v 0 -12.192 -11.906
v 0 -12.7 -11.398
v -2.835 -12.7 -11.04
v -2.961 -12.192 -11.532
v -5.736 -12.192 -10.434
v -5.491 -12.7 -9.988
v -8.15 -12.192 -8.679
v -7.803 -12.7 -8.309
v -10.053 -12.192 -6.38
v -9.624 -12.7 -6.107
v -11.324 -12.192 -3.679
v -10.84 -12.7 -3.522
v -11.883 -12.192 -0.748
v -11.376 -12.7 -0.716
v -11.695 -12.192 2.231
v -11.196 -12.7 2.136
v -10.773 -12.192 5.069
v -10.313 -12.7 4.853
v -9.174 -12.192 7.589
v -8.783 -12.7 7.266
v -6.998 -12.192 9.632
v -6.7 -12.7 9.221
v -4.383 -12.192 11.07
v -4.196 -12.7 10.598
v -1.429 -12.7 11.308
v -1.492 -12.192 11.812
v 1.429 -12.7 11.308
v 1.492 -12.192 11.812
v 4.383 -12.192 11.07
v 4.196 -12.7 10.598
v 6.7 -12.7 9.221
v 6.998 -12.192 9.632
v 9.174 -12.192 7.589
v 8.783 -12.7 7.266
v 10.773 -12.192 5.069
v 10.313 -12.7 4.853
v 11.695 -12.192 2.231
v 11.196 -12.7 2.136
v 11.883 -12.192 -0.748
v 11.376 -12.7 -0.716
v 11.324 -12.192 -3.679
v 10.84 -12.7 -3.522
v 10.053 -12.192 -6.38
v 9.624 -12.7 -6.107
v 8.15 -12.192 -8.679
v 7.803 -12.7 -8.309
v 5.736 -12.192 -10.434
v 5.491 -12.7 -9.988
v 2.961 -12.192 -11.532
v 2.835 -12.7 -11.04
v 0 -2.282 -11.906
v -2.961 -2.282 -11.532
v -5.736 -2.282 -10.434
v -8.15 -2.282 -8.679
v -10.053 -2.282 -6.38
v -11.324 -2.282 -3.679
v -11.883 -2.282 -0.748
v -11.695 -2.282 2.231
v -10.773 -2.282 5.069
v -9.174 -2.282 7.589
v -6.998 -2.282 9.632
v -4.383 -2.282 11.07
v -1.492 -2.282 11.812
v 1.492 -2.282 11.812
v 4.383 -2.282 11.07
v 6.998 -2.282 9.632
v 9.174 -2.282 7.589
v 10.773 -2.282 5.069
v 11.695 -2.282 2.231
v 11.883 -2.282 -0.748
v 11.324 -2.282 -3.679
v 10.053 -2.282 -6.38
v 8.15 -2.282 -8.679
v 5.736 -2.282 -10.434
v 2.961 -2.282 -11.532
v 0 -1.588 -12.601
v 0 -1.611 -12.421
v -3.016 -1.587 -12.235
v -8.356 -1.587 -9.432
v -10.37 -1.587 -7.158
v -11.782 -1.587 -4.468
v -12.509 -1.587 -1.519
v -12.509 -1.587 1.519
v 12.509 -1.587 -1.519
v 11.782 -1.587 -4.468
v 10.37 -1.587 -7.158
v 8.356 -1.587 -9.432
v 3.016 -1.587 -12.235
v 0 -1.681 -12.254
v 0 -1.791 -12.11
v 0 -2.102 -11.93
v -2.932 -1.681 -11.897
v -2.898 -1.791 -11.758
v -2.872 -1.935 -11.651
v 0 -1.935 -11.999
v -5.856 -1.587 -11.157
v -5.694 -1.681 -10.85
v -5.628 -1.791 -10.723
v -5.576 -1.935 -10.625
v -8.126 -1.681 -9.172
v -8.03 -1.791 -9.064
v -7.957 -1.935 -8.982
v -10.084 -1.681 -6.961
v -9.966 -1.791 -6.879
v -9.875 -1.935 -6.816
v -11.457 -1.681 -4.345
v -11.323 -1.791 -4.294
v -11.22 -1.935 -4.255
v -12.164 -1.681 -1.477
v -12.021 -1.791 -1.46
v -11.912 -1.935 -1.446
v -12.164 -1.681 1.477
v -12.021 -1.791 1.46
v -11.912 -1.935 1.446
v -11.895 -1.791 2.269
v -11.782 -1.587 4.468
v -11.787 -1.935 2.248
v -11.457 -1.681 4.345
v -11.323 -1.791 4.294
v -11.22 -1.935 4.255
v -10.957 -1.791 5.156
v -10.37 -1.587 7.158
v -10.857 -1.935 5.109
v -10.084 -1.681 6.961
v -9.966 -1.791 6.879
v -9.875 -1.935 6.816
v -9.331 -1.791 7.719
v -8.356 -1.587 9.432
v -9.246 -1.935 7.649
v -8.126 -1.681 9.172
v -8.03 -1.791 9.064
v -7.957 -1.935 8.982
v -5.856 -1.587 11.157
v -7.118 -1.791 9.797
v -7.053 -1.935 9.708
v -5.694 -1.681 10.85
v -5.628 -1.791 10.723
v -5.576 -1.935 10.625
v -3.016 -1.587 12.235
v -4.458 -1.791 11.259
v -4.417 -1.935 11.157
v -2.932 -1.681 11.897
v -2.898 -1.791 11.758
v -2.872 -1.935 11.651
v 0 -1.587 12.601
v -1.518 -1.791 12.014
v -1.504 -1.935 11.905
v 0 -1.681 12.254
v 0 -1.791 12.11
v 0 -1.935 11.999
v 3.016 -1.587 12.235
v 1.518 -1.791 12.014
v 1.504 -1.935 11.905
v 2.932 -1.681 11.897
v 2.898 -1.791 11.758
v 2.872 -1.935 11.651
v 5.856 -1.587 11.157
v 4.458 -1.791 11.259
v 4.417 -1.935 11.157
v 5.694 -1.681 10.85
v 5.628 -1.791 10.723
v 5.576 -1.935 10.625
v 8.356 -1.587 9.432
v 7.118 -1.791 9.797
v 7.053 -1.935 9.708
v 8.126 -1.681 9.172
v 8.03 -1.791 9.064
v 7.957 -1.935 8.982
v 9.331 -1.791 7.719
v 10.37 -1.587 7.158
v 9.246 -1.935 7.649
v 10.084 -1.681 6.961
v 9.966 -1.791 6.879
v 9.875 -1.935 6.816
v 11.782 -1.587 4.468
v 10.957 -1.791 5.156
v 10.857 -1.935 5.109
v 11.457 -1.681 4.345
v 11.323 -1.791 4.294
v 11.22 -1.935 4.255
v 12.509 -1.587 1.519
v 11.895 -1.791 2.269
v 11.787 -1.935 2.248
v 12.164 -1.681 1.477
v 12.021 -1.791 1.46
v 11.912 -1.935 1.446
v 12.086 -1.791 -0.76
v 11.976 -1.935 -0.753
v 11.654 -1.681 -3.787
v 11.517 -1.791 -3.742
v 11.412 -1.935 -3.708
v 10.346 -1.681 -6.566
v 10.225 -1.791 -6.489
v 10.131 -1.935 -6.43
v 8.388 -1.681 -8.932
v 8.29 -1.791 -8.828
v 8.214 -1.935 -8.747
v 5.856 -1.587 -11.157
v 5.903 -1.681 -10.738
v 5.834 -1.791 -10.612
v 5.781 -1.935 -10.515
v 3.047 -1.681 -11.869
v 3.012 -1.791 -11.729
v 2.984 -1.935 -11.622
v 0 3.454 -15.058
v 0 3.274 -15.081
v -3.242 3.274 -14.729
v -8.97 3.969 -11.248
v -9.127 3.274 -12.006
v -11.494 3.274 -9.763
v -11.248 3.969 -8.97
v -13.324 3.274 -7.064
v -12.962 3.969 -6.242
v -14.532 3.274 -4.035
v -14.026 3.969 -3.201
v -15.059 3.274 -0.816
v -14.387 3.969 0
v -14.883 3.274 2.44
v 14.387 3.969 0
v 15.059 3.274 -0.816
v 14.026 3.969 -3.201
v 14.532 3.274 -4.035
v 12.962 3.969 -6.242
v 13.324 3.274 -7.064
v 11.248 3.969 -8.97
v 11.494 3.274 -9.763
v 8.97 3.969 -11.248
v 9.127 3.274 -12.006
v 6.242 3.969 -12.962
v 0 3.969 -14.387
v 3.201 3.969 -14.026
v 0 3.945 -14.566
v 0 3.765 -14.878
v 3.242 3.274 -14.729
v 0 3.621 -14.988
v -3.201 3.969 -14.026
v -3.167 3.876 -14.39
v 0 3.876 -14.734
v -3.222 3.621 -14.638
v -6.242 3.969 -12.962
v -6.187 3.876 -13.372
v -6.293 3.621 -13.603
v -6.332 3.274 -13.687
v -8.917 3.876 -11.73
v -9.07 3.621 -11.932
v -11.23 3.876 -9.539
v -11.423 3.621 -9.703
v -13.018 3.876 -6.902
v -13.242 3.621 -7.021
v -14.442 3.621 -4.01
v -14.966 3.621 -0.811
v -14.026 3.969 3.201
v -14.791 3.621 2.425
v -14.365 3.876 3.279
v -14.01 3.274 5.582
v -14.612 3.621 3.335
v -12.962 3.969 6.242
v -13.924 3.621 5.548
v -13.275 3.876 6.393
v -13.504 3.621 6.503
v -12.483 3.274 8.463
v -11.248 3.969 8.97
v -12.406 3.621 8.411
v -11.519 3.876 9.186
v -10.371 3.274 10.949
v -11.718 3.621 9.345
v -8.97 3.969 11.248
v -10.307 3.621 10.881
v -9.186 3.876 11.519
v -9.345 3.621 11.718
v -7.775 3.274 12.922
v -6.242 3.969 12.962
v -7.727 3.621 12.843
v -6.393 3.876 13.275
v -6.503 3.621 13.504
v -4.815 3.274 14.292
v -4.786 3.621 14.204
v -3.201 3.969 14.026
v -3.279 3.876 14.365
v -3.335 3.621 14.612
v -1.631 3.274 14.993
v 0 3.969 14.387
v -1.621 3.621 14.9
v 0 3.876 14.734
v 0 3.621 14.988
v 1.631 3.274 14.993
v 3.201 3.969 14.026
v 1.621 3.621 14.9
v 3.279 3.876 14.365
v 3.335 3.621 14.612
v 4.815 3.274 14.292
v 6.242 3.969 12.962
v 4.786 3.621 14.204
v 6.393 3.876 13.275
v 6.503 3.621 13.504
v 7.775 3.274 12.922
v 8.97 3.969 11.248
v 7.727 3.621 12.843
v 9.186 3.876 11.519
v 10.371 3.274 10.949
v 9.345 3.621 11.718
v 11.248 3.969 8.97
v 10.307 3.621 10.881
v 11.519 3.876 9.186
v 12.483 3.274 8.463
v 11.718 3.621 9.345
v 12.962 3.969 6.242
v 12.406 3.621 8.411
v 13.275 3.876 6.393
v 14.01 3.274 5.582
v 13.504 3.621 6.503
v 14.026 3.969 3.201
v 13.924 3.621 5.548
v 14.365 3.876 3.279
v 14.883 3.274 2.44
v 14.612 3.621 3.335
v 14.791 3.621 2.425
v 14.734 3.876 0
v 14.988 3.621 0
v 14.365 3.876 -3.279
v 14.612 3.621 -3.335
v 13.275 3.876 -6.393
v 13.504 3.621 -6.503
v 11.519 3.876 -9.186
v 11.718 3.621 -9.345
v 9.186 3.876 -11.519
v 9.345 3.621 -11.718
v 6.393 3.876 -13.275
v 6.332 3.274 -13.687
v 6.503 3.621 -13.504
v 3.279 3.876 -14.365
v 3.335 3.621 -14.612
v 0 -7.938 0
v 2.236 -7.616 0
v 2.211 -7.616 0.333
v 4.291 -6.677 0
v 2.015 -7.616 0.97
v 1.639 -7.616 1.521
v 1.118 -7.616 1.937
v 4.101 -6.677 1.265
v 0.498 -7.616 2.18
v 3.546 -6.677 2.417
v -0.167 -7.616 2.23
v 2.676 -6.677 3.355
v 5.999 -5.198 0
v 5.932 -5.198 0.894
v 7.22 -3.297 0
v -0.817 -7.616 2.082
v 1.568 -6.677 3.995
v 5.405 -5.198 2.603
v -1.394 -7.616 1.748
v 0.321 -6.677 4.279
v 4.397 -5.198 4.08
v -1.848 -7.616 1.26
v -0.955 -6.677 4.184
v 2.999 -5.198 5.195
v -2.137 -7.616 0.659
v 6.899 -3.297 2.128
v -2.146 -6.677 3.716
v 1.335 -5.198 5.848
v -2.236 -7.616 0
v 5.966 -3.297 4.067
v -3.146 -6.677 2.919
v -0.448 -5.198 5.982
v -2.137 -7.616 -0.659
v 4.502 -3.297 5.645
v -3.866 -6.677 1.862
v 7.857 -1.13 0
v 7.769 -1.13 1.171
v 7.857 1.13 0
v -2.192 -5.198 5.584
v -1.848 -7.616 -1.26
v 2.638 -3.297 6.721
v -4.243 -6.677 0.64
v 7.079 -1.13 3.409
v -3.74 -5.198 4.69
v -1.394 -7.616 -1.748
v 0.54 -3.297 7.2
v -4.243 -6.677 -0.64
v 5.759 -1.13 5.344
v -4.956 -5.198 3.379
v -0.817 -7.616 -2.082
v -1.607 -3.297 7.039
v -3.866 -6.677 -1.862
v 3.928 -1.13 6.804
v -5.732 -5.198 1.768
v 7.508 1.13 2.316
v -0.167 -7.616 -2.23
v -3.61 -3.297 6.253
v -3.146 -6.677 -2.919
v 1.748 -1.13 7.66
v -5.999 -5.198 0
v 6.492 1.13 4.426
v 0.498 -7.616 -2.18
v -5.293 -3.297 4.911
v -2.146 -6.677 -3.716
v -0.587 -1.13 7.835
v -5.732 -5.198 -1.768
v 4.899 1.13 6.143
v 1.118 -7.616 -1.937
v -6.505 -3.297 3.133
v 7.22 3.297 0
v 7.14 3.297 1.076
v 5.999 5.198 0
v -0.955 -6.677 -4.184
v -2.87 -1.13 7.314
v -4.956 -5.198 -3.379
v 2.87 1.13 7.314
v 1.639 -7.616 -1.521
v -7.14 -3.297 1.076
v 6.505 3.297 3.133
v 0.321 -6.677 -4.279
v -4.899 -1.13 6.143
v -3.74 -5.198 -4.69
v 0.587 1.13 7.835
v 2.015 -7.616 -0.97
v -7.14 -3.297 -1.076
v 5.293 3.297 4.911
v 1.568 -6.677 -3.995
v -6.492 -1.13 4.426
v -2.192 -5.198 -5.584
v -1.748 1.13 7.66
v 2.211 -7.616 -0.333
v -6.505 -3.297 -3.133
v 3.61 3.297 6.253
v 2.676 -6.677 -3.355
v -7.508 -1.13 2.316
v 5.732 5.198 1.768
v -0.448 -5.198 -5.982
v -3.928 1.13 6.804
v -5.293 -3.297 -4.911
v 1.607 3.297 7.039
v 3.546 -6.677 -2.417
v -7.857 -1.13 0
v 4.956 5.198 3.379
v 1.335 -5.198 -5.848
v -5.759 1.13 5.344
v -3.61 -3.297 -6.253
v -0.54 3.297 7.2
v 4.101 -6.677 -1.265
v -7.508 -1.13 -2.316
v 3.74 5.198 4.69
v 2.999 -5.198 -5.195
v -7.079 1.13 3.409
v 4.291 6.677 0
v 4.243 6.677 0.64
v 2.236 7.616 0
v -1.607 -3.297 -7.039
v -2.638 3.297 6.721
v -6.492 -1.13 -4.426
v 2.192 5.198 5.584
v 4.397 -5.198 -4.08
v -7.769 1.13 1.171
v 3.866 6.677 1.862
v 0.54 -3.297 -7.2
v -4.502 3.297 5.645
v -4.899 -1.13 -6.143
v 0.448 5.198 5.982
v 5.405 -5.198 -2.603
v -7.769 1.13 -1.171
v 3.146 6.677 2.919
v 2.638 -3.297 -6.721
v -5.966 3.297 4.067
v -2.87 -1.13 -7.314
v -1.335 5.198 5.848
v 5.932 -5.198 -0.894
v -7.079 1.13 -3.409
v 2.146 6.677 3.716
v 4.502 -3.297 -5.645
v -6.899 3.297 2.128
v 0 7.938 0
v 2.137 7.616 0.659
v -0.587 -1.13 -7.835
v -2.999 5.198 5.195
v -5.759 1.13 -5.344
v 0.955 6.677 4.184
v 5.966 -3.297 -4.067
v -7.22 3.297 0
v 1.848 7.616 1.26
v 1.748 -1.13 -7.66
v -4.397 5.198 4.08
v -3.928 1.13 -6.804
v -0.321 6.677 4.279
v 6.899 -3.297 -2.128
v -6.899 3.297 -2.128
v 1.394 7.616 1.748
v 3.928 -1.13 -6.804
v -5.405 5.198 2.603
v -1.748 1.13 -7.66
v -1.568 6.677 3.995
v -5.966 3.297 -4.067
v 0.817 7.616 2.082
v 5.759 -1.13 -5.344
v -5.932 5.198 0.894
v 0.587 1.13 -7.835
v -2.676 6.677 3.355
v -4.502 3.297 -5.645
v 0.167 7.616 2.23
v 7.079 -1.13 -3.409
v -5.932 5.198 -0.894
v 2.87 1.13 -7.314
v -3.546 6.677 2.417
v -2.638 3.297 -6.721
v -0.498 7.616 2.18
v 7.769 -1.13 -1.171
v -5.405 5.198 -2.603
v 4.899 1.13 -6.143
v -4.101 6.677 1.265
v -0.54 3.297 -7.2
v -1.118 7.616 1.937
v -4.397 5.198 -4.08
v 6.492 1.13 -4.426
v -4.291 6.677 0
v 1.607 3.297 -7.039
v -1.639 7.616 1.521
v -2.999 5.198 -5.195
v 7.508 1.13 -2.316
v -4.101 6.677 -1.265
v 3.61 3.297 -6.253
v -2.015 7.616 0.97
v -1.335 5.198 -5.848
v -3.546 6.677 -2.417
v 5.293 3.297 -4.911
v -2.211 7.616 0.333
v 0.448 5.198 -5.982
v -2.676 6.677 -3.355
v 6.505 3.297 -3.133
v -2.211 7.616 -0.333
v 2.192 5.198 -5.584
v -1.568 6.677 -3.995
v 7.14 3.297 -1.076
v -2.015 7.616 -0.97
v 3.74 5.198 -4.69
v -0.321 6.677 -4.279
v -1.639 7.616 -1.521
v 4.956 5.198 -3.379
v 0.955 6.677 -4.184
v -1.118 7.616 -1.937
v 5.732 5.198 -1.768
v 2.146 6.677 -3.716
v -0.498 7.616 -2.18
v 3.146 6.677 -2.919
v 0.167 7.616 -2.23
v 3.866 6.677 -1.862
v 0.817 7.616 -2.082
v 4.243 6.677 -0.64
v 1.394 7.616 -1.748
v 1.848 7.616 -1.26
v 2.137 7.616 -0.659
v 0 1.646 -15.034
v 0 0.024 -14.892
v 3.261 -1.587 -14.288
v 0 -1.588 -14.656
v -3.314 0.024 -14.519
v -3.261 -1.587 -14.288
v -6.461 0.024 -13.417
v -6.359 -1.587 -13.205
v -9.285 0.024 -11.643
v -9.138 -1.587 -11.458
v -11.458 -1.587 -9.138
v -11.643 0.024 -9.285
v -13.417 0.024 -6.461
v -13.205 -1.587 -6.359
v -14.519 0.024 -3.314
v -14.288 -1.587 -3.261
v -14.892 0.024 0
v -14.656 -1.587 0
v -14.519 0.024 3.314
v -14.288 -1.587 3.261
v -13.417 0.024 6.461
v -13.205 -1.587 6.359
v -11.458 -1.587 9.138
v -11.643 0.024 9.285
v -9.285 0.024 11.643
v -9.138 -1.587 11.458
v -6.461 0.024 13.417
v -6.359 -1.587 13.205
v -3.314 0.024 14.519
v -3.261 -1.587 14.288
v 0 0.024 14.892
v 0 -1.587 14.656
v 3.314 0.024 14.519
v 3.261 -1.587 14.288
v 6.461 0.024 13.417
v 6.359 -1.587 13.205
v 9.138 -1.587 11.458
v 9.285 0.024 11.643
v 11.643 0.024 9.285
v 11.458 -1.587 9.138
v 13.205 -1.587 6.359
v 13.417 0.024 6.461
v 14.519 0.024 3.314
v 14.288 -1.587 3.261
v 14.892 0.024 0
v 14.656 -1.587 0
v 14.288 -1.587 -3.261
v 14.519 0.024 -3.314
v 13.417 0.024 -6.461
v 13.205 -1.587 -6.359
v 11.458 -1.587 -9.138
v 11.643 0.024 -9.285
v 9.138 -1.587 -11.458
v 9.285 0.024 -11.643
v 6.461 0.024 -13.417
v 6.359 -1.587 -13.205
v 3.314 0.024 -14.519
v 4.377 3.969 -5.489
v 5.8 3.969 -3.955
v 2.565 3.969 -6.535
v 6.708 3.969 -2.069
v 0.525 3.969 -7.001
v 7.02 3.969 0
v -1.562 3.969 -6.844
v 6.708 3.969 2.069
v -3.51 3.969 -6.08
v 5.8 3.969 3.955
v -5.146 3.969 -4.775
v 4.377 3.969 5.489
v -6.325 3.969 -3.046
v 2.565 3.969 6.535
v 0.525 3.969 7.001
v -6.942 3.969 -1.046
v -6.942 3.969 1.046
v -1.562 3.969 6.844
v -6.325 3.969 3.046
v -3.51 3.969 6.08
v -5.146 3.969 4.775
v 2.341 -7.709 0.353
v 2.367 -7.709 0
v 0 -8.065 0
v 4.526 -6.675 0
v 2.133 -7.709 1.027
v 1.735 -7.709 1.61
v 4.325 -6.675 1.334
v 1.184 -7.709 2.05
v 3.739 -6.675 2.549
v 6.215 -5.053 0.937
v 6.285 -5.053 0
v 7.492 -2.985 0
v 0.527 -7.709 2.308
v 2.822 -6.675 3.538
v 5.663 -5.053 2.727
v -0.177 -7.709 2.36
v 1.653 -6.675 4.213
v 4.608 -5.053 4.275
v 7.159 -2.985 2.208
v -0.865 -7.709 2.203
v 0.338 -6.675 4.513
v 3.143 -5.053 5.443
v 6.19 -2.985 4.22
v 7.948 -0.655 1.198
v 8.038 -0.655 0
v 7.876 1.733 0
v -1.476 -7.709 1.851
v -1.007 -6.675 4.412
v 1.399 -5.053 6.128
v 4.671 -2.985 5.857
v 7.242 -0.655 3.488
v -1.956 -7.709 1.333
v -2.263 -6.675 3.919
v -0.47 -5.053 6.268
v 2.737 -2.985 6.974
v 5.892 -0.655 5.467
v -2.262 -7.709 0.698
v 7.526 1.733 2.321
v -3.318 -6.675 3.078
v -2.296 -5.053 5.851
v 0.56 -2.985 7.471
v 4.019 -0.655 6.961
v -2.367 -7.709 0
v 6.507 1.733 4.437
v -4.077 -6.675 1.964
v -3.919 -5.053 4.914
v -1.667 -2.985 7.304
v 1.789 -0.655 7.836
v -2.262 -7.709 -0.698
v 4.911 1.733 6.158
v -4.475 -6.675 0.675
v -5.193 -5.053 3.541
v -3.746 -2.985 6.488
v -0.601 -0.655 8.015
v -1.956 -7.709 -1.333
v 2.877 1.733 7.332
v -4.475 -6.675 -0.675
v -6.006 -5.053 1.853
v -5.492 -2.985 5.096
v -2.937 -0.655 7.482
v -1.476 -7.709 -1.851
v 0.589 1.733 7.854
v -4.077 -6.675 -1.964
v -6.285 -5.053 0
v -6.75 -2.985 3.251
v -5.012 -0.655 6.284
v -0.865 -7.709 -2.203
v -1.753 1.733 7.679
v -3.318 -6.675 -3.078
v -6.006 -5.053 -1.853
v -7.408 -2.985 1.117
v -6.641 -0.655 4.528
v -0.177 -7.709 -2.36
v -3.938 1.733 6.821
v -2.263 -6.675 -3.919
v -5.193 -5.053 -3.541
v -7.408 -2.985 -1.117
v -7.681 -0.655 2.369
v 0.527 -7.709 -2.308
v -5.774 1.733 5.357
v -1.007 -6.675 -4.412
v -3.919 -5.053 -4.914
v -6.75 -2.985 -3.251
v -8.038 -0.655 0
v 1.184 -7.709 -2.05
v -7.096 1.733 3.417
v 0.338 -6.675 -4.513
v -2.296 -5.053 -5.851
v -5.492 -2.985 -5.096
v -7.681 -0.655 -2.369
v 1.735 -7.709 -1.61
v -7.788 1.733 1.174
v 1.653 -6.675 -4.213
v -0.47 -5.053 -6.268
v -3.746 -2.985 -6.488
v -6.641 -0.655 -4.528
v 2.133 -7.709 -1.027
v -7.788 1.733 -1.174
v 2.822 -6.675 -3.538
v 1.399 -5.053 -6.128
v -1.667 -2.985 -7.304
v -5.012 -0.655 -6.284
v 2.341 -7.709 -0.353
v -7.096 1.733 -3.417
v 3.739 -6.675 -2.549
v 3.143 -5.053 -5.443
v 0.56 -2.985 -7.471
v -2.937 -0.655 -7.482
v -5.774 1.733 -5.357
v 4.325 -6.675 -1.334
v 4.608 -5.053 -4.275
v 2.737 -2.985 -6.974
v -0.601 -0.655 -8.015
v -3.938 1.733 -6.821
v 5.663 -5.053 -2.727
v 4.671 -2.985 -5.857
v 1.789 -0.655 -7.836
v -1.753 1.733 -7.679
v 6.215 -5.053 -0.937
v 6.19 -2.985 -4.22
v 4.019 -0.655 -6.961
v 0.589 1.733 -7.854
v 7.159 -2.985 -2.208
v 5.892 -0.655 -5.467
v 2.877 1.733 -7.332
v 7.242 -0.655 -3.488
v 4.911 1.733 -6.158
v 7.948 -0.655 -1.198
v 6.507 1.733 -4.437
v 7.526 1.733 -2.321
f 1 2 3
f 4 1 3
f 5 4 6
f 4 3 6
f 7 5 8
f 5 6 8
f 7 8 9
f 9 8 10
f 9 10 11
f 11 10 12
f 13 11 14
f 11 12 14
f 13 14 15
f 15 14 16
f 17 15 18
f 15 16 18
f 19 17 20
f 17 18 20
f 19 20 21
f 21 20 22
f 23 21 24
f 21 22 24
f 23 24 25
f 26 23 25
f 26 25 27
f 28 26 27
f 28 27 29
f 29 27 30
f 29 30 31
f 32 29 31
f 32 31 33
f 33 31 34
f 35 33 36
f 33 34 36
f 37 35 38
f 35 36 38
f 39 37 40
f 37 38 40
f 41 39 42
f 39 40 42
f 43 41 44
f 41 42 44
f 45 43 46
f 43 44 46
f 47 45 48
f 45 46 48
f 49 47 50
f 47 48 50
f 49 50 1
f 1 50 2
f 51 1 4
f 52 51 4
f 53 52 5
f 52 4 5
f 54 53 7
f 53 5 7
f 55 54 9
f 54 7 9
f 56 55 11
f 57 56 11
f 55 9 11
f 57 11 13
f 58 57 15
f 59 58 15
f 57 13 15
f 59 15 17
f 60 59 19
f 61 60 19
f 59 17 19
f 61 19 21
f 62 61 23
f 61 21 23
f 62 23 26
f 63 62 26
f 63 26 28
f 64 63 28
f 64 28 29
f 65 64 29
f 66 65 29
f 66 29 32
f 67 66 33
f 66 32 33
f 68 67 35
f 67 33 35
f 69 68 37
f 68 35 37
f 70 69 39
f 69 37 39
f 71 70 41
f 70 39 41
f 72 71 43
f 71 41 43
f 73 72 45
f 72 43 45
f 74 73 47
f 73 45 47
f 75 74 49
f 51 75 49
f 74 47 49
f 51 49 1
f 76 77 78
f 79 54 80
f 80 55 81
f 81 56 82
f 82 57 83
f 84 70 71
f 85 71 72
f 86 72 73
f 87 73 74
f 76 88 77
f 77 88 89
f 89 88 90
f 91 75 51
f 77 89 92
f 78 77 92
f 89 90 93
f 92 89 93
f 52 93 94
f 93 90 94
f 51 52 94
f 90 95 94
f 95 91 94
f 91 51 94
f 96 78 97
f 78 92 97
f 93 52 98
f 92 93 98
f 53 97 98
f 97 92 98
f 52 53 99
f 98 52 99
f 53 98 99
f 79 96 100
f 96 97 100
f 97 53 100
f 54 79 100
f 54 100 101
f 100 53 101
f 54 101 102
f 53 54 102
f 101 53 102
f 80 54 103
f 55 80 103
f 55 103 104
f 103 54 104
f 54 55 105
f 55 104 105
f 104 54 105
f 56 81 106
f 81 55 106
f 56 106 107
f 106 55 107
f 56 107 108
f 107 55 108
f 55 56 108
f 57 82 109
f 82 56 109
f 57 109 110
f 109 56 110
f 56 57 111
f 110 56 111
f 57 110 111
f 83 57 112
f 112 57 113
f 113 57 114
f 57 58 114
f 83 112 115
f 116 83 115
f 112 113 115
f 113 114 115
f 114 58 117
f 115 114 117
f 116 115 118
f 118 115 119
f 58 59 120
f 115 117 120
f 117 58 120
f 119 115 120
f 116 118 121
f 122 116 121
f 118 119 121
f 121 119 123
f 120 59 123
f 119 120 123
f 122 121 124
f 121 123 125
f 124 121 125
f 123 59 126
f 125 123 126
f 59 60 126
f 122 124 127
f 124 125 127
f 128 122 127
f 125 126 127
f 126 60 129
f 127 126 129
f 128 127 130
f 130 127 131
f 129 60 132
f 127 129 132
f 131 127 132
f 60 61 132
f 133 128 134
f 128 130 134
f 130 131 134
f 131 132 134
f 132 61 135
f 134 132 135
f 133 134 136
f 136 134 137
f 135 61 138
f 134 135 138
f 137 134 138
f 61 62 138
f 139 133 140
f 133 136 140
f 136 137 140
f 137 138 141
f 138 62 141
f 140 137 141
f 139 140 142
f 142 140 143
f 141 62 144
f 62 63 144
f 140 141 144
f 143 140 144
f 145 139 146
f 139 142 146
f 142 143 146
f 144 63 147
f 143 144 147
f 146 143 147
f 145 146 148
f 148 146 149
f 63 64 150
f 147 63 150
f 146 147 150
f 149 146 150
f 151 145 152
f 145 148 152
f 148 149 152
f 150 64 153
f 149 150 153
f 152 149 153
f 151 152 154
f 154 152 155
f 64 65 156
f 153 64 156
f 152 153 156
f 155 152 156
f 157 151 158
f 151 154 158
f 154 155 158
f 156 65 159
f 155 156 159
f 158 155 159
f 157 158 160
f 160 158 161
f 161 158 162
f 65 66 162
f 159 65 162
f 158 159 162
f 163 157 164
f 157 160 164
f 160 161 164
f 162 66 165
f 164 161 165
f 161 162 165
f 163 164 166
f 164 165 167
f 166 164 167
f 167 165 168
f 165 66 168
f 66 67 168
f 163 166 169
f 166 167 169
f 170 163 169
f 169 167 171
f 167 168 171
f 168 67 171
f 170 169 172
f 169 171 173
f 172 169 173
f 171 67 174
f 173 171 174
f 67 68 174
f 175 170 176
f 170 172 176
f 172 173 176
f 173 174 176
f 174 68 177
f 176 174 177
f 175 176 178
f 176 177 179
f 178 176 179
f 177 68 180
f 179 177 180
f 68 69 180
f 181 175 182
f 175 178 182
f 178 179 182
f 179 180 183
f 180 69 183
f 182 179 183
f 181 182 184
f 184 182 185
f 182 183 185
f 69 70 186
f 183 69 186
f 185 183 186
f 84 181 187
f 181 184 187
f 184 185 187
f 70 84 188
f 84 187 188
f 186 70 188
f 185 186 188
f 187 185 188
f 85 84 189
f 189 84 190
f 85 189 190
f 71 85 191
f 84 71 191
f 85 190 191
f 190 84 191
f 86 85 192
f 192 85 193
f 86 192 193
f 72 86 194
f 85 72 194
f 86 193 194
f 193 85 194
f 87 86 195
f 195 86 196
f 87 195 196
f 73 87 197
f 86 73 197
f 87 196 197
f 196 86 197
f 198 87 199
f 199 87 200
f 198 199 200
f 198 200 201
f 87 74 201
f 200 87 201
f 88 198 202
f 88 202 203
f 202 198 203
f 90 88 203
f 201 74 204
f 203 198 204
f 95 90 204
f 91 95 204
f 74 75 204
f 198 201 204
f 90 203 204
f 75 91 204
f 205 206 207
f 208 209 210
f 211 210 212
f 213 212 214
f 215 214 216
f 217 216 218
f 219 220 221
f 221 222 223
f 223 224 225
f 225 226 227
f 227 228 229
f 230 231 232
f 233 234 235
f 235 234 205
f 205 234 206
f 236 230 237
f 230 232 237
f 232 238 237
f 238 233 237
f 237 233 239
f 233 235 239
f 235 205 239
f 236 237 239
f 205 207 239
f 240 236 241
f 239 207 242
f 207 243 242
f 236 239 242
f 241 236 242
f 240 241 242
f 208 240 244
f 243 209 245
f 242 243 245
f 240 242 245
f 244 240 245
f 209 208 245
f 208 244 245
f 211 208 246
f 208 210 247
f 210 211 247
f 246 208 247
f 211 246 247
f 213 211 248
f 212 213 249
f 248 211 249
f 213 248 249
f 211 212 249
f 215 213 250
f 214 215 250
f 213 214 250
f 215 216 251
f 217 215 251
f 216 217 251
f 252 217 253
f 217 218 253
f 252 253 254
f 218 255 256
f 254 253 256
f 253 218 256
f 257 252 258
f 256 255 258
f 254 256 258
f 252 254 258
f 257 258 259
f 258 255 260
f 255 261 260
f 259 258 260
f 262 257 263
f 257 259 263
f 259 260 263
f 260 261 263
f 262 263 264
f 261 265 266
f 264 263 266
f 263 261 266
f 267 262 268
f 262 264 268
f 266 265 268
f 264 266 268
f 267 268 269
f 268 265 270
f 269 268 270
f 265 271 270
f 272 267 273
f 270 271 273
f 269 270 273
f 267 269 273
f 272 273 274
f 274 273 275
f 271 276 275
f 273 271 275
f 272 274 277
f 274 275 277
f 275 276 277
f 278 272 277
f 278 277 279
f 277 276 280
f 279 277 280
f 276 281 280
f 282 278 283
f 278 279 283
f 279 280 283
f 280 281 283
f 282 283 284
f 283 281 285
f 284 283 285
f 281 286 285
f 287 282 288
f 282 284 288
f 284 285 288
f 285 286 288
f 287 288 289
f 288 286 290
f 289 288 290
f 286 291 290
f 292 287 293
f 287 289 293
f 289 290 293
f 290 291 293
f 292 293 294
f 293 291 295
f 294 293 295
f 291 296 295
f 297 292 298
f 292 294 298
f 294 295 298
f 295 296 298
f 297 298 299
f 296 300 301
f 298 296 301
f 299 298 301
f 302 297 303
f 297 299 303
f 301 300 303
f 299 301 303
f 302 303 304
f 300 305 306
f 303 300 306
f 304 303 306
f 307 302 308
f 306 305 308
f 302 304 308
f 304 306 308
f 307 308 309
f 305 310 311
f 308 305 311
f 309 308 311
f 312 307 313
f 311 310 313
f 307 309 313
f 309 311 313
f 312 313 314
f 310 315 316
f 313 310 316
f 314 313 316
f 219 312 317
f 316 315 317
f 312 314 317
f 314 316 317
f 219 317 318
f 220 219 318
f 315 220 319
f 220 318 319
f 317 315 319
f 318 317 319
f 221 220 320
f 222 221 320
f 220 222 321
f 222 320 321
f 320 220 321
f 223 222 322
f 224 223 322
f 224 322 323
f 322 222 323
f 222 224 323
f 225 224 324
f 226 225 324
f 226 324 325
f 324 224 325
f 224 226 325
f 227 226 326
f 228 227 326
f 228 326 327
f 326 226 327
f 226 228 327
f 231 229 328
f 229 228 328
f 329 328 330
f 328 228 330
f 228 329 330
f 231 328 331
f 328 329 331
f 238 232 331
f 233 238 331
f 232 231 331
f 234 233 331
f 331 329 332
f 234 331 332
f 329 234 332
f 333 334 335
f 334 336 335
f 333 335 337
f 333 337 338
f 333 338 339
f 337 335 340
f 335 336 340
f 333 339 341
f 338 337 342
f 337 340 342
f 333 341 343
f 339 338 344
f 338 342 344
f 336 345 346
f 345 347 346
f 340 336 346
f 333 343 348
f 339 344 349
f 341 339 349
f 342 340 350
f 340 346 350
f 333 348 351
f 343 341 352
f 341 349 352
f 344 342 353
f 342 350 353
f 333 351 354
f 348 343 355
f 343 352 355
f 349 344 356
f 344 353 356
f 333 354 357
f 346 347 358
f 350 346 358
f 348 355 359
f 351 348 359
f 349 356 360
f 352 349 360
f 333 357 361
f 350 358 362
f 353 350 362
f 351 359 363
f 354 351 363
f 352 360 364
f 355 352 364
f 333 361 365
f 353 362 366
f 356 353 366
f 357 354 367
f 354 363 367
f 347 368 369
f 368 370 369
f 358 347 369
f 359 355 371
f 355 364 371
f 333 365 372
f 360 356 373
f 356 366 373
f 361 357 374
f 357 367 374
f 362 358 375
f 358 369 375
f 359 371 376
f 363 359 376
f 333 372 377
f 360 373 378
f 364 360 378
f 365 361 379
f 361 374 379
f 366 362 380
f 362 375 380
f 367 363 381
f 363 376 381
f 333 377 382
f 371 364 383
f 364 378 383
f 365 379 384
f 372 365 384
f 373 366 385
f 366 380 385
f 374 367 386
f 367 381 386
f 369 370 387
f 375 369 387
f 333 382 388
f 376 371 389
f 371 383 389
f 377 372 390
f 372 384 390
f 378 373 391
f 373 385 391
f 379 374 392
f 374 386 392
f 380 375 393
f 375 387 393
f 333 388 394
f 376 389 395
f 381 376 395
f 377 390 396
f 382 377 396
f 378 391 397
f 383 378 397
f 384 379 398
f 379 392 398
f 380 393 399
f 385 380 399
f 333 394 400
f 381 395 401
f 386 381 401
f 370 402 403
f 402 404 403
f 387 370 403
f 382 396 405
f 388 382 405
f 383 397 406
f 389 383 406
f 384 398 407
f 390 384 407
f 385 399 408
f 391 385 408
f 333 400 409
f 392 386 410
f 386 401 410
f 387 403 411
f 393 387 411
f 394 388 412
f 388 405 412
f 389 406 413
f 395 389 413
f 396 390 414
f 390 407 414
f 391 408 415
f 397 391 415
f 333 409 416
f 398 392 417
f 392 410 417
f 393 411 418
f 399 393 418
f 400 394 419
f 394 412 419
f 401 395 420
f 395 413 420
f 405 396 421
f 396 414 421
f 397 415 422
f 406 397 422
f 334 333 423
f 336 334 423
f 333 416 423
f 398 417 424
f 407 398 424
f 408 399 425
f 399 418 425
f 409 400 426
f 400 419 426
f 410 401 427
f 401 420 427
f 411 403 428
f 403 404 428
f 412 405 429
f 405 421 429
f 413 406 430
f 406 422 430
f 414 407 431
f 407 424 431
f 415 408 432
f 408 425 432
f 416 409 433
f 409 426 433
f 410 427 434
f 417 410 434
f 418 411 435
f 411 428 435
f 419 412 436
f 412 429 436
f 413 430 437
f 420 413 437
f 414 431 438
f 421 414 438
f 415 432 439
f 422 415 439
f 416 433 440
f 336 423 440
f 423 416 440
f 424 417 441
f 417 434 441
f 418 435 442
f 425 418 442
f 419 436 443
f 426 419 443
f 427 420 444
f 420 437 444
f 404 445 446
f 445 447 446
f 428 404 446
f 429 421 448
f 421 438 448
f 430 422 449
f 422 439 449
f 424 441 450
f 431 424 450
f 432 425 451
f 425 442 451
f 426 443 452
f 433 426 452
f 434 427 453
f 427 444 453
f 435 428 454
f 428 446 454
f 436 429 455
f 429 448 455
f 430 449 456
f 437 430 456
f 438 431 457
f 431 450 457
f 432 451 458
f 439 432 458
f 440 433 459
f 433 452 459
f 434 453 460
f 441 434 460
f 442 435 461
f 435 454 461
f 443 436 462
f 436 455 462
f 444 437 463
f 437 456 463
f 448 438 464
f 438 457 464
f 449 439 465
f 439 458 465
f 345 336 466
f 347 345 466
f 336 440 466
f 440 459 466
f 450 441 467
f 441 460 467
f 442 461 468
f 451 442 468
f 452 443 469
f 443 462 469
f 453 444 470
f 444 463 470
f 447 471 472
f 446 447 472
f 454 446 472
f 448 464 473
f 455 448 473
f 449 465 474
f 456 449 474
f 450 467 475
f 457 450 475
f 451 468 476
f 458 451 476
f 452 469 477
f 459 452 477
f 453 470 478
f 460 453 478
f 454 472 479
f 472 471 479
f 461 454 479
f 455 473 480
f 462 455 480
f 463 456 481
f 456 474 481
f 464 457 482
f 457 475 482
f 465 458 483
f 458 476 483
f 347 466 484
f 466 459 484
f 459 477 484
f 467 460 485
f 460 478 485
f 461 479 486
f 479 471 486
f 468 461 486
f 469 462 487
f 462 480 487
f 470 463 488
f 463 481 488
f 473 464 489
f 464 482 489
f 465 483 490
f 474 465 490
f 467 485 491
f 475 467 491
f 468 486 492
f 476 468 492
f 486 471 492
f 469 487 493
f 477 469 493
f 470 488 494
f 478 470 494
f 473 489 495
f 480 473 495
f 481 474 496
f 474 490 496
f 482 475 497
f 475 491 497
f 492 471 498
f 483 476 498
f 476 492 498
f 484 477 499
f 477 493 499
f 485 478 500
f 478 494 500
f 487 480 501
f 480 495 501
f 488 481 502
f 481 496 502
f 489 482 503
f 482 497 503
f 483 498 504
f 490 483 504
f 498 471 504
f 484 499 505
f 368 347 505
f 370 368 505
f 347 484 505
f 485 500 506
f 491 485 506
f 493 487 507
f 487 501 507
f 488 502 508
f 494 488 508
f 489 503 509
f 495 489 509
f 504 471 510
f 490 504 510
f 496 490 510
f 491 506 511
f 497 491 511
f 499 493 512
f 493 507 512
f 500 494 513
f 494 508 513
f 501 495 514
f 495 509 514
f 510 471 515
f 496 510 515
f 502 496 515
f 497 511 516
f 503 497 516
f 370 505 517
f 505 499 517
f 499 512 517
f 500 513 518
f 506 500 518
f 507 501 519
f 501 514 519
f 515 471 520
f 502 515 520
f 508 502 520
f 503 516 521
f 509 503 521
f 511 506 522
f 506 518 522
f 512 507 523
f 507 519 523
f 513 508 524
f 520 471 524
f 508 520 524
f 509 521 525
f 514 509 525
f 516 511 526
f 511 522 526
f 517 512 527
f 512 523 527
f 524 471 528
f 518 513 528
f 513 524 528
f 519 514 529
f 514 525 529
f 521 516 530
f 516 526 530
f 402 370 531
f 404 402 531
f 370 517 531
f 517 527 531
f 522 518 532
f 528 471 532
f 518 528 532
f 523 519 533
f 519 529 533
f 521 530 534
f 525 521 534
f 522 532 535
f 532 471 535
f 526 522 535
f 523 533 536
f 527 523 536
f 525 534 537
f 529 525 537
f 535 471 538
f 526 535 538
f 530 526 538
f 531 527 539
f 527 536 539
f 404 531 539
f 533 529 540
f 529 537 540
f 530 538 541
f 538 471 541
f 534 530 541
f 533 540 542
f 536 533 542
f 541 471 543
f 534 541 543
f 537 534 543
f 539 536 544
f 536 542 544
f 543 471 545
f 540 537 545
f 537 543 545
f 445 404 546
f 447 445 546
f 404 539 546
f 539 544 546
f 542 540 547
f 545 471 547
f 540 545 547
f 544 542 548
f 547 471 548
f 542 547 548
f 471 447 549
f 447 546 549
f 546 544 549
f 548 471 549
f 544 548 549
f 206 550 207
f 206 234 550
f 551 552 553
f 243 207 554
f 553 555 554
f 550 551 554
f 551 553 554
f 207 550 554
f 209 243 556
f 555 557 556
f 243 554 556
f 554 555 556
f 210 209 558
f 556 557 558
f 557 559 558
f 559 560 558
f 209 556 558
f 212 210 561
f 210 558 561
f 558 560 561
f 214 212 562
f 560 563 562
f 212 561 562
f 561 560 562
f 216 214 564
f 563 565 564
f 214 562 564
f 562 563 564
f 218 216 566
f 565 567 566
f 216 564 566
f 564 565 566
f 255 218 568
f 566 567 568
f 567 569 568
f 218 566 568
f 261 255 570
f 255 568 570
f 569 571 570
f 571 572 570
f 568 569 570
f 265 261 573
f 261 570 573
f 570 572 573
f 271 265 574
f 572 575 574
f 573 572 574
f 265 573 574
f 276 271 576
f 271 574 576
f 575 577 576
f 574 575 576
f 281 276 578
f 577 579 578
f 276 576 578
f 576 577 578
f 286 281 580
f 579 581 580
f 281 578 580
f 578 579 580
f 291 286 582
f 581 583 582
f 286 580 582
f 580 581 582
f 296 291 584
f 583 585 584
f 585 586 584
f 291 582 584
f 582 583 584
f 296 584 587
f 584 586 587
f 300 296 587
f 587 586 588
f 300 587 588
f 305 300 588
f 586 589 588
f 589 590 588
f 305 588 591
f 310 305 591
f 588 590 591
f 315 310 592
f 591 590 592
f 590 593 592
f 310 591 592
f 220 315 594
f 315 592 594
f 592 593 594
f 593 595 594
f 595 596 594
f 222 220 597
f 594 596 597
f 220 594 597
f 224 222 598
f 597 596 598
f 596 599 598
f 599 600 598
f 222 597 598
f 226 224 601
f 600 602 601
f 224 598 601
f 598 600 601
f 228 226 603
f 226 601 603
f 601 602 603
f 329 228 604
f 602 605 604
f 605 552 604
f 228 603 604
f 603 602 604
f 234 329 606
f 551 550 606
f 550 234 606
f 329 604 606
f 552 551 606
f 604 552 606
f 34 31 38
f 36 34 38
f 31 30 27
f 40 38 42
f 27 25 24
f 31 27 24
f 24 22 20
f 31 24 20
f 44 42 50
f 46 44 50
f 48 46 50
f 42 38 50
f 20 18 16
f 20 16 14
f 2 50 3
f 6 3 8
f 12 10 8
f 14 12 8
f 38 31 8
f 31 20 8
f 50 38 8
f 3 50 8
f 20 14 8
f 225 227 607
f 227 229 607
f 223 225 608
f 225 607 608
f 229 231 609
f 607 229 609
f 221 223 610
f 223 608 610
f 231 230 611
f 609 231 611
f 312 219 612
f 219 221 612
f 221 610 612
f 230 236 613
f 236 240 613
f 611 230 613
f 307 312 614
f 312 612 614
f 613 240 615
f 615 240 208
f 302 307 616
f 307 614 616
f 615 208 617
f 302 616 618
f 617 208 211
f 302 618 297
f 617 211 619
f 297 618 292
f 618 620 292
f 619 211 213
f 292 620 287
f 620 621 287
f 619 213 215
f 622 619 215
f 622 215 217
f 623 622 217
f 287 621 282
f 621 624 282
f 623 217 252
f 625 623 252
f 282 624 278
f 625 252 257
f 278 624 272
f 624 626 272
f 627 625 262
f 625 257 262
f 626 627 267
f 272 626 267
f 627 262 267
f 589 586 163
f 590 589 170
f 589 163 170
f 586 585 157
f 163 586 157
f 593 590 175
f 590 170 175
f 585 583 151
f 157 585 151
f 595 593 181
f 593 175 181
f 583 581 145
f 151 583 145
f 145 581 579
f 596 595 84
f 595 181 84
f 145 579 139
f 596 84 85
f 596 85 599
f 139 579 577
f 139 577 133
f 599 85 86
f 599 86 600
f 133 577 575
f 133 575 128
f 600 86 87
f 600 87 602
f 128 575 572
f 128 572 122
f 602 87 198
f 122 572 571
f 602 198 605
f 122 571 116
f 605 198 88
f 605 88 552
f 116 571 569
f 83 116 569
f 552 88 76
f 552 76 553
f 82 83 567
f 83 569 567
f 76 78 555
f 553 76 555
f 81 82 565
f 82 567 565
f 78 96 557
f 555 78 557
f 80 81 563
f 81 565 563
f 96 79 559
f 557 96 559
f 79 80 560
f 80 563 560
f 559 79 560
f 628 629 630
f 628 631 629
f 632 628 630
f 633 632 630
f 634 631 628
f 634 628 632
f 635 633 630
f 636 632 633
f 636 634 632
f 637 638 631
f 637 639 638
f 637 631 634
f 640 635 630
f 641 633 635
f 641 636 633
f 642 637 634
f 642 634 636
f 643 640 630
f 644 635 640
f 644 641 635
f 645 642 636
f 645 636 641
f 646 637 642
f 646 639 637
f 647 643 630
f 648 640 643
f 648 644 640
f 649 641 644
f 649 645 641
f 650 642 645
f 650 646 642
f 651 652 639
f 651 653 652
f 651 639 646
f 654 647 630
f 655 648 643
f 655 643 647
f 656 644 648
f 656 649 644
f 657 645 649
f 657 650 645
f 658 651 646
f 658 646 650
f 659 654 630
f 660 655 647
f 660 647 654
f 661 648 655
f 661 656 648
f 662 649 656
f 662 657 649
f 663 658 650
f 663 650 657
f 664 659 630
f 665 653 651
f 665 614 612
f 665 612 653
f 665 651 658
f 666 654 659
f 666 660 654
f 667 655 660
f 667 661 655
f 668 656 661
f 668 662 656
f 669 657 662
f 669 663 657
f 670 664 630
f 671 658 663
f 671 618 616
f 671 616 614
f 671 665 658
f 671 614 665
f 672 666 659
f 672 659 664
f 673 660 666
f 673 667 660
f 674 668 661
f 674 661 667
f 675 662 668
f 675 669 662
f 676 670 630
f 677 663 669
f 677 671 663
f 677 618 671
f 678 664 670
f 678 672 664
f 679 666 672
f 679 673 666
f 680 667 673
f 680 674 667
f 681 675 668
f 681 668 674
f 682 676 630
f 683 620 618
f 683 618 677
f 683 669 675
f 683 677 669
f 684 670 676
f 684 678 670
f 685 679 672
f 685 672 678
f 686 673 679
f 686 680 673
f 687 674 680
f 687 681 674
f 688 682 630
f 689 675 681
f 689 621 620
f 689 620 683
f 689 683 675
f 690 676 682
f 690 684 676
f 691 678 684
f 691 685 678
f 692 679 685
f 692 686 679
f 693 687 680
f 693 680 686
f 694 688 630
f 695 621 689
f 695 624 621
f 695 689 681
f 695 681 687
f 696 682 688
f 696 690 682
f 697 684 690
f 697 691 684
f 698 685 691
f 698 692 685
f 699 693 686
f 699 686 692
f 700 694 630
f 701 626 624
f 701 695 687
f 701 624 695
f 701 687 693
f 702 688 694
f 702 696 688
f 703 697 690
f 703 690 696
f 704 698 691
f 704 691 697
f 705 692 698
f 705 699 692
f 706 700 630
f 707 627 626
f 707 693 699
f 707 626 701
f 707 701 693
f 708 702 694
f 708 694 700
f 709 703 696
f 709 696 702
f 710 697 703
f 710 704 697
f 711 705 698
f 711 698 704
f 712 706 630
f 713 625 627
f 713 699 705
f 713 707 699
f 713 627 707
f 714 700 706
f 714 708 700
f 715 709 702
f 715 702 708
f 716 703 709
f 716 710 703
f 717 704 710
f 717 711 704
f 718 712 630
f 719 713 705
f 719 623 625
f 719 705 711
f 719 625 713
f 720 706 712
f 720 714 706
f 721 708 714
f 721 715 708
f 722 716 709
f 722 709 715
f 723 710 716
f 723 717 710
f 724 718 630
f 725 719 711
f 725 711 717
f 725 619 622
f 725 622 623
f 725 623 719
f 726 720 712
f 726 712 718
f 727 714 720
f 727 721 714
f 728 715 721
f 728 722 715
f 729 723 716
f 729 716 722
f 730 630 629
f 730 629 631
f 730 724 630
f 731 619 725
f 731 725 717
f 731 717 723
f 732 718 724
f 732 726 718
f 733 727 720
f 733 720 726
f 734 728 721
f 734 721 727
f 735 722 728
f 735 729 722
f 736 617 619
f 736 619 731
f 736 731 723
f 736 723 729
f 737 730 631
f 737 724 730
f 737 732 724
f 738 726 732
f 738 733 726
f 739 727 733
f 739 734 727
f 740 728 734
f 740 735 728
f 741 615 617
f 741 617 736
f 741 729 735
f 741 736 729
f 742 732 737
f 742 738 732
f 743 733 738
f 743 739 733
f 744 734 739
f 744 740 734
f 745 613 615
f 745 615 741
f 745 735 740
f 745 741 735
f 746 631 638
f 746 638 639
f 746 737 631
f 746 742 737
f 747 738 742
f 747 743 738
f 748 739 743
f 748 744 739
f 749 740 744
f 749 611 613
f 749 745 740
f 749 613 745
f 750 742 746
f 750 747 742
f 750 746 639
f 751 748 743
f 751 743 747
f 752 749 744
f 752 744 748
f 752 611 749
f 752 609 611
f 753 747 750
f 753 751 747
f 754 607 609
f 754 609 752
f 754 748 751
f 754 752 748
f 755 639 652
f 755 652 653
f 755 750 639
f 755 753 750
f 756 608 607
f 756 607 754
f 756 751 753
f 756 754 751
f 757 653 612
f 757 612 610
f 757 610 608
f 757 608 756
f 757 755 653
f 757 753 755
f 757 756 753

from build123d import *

# Parameters (mm, degrees)
MOVE_FACE1_BY      = 0.127
CHAMFER2_SIZE      = 0.508
CHAMFER1_SIZE      = 0.9525
CUT_SWEEP1_PITCH   = 1.27
CUT_SWEEP1_TO      = 19.05
SKETCH7_R          = 5.08
CUT_EXTRUDE1_DEPTH = 19.05


with BuildPart() as part:
    # Sketch1 → Revolve1 (revolve)
    with BuildSketch(Plane.XY, mode=Mode.PRIVATE) as revolve1_sk:
        with BuildLine():
            Line((0, 3.96875), (14.38671875, 3.96875))
            ThreePointArc((14.38671875, 3.96875), (14.877826507, 3.765326507), (15.08125, 3.27421875))
            ThreePointArc((15.08125, 3.27421875), (14.974710974, 0.834073887), (14.655904724, -1.5875))
            Line((14.655904724, -1.5875), (12.60078125, -1.5875))
            ThreePointArc((12.60078125, -1.5875), (12.109673493, -1.790923493), (11.90625, -2.28203125))
            Line((11.90625, -2.28203125), (11.90625, -12.7))
            Line((11.90625, -12.7), (3.175, -12.7))
            Line((3.175, -12.7), (3.175, -31.75))
            Line((3.175, -31.75), (0, -31.75))
            Line((0, -31.75), (0, 3.96875))
        make_face()
    revolve(revolve1_sk.sketch.rotate(Axis((0, -31.75, 0), (0, 1, 0)), 90), axis=Axis((0, -31.75, 0), (0, 1, 0)))

    # Sketch2 → Cut-Revolve1 (revolve, cut)
    with BuildSketch(Plane.XY):
        with BuildLine():
            Line((0, 7.9375), (0, -7.9375))
            ThreePointArc((0, -7.9375), (7.9375, 0), (0, 7.9375))
        make_face()
    revolve(axis=Axis((0, 7.9375, 0), (0, -1, 0)), mode=Mode.SUBTRACT)

    # Move Face1: a curved face moved inward by 0.127
    add(Solid.thicken(part.faces().sort_by_distance((-6.874076643, -3.96875, 0))[0], -MOVE_FACE1_BY), mode=Mode.SUBTRACT)

    # Chamfer2
    chamfer2_edges = [part.edges().sort_by_distance(p)[0] for p in [
        (0, -12.7, 11.90625),
    ]]
    chamfer(chamfer2_edges, length=CHAMFER2_SIZE)

    # Chamfer1
    chamfer1_edges = [part.edges().sort_by_distance(p)[0] for p in [
        (0, -31.75, 3.175),
    ]]
    chamfer(chamfer1_edges, length=CHAMFER1_SIZE)


with BuildPart() as body_2:
    # Sketch2<2> → Revolve2 (revolve)
    with BuildSketch(Plane.XY):
        with BuildLine():
            Line((0, 7.9375), (0, -7.9375))
            ThreePointArc((0, -7.9375), (7.9375, 0), (0, 7.9375))
        make_face()
    revolve(axis=Axis((0, 7.9375, 0), (0, -1, 0)))


with BuildPart() as body_3:
    # Split1: read off the stored shape, not the designer's step
    # Split1: the piece on the far side of the plane
    add(part.part)
    split(bisect_by=Plane(origin=(0, -12.7, 0), x_dir=(1, 0, 0), z_dir=(0, 1, 0)), keep=Keep.BOTTOM)

    # Cut-Sweep1: arcs per turn and ends read off the stored shape
    # Cut-Sweep1: the profile of Sketch4 profile screwed along a right-hand helix through 16 turns, 8 arcs to a turn; built about Z, then put on its axis
    cut_sweep1_z = Axis((0, 0, 0), (0, 0, 1))
    cut_sweep1_corners = [(3.1753, 0, 0.952673205), (3.1753, 0, -0.158923205), (2.350110803, 0, 0.3175), (2.350110803, 0, 0.47625)]
    with BuildLine(mode=Mode.PRIVATE) as cut_sweep1_profile:
        Line(cut_sweep1_corners[0], cut_sweep1_corners[1])
        Line(cut_sweep1_corners[1], cut_sweep1_corners[2])
        Line(cut_sweep1_corners[2], cut_sweep1_corners[3])
        Line(cut_sweep1_corners[3], cut_sweep1_corners[0])
    cut_sweep1_cap = Face(cut_sweep1_profile.wire())
    cut_sweep1_turn_angles = [0, 22.5, 45, 67.5, 90, 112.5, 135, 157.5, 180, 202.5, 225, 247.5, 270, 292.5, 315, 337.5, 360]
    cut_sweep1_turn_weights = [1, 0.9238795325112867, 1, 0.9238795325112867, 1, 0.9238795325112867, 1, 0.9238795325112867, 1, 0.9238795325112867, 1, 0.9238795325112867, 1, 0.9238795325112867, 1, 0.9238795325112867, 1]
    cut_sweep1_turn_rails = [Edge.make_bspline([Vector(p[0], p[1], 0).rotate(cut_sweep1_z, cut_sweep1_turn_angles[k]) / cut_sweep1_turn_weights[k] + Vector(0, 0, p[2] + CUT_SWEEP1_PITCH * cut_sweep1_turn_angles[k] / 360) for k in range(17)], [0, 0, 0, 1, 1, 2, 2, 3, 3, 4, 4, 5, 5, 6, 6, 7, 7, 8, 8, 8], 2, cut_sweep1_turn_weights) for p in cut_sweep1_corners]
    cut_sweep1_turn_sides = [Face.make_surface_from_curves(cut_sweep1_turn_rails[p[0]], cut_sweep1_turn_rails[p[1]]) for p in [(0, 1), (1, 2), (2, 3), (3, 0)]]
    cut_sweep1 = Plane(origin=(0, -31.75, 0), x_dir=(1, 0, 0), z_dir=(0, 1, 0)) * split(Solid(Shell([*[p.moved(Location((0, 0, CUT_SWEEP1_PITCH * i))) for i in range(16) for p in cut_sweep1_turn_sides], cut_sweep1_cap, cut_sweep1_cap.rotate(cut_sweep1_z, 5760).moved(Location((0, 0, CUT_SWEEP1_PITCH * 5760 / 360)))])), bisect_by=Plane.XY.offset(CUT_SWEEP1_TO), keep=Keep.BOTTOM, mode=Mode.PRIVATE)
    add(cut_sweep1, mode=Mode.SUBTRACT)


with BuildPart() as part_1:
    add(part.part)

    # Split1
    split(bisect_by=Plane(origin=(0, -12.7, 0), x_dir=(1, 0, 0), z_dir=(0, 1, 0)), keep=Keep.TOP)

    add(body_3.part)  # Boss-Extrude1 merges body 3
    # Boss-Extrude1: read off the stored shape, not the designer's step
    # Boss-Extrude1 outline → Boss-Extrude1 (revolve)
    with BuildSketch(Plane.XY):
        Polygon((2.350109772, -12.7), (2.350109772, -14.966367275), (3.175, -12.7), align=None)
    revolve(axis=Axis((0, 0, 0), (0, 1, 0)))

    # Sketch7 → Cut-Extrude1 (cut)
    with BuildSketch(Plane.XZ.offset(31.75)):
        Circle(SKETCH7_R)
    extrude(amount=-CUT_EXTRUDE1_DEPTH, mode=Mode.SUBTRACT)


solid = Compound([body_2.part, part_1.part])
